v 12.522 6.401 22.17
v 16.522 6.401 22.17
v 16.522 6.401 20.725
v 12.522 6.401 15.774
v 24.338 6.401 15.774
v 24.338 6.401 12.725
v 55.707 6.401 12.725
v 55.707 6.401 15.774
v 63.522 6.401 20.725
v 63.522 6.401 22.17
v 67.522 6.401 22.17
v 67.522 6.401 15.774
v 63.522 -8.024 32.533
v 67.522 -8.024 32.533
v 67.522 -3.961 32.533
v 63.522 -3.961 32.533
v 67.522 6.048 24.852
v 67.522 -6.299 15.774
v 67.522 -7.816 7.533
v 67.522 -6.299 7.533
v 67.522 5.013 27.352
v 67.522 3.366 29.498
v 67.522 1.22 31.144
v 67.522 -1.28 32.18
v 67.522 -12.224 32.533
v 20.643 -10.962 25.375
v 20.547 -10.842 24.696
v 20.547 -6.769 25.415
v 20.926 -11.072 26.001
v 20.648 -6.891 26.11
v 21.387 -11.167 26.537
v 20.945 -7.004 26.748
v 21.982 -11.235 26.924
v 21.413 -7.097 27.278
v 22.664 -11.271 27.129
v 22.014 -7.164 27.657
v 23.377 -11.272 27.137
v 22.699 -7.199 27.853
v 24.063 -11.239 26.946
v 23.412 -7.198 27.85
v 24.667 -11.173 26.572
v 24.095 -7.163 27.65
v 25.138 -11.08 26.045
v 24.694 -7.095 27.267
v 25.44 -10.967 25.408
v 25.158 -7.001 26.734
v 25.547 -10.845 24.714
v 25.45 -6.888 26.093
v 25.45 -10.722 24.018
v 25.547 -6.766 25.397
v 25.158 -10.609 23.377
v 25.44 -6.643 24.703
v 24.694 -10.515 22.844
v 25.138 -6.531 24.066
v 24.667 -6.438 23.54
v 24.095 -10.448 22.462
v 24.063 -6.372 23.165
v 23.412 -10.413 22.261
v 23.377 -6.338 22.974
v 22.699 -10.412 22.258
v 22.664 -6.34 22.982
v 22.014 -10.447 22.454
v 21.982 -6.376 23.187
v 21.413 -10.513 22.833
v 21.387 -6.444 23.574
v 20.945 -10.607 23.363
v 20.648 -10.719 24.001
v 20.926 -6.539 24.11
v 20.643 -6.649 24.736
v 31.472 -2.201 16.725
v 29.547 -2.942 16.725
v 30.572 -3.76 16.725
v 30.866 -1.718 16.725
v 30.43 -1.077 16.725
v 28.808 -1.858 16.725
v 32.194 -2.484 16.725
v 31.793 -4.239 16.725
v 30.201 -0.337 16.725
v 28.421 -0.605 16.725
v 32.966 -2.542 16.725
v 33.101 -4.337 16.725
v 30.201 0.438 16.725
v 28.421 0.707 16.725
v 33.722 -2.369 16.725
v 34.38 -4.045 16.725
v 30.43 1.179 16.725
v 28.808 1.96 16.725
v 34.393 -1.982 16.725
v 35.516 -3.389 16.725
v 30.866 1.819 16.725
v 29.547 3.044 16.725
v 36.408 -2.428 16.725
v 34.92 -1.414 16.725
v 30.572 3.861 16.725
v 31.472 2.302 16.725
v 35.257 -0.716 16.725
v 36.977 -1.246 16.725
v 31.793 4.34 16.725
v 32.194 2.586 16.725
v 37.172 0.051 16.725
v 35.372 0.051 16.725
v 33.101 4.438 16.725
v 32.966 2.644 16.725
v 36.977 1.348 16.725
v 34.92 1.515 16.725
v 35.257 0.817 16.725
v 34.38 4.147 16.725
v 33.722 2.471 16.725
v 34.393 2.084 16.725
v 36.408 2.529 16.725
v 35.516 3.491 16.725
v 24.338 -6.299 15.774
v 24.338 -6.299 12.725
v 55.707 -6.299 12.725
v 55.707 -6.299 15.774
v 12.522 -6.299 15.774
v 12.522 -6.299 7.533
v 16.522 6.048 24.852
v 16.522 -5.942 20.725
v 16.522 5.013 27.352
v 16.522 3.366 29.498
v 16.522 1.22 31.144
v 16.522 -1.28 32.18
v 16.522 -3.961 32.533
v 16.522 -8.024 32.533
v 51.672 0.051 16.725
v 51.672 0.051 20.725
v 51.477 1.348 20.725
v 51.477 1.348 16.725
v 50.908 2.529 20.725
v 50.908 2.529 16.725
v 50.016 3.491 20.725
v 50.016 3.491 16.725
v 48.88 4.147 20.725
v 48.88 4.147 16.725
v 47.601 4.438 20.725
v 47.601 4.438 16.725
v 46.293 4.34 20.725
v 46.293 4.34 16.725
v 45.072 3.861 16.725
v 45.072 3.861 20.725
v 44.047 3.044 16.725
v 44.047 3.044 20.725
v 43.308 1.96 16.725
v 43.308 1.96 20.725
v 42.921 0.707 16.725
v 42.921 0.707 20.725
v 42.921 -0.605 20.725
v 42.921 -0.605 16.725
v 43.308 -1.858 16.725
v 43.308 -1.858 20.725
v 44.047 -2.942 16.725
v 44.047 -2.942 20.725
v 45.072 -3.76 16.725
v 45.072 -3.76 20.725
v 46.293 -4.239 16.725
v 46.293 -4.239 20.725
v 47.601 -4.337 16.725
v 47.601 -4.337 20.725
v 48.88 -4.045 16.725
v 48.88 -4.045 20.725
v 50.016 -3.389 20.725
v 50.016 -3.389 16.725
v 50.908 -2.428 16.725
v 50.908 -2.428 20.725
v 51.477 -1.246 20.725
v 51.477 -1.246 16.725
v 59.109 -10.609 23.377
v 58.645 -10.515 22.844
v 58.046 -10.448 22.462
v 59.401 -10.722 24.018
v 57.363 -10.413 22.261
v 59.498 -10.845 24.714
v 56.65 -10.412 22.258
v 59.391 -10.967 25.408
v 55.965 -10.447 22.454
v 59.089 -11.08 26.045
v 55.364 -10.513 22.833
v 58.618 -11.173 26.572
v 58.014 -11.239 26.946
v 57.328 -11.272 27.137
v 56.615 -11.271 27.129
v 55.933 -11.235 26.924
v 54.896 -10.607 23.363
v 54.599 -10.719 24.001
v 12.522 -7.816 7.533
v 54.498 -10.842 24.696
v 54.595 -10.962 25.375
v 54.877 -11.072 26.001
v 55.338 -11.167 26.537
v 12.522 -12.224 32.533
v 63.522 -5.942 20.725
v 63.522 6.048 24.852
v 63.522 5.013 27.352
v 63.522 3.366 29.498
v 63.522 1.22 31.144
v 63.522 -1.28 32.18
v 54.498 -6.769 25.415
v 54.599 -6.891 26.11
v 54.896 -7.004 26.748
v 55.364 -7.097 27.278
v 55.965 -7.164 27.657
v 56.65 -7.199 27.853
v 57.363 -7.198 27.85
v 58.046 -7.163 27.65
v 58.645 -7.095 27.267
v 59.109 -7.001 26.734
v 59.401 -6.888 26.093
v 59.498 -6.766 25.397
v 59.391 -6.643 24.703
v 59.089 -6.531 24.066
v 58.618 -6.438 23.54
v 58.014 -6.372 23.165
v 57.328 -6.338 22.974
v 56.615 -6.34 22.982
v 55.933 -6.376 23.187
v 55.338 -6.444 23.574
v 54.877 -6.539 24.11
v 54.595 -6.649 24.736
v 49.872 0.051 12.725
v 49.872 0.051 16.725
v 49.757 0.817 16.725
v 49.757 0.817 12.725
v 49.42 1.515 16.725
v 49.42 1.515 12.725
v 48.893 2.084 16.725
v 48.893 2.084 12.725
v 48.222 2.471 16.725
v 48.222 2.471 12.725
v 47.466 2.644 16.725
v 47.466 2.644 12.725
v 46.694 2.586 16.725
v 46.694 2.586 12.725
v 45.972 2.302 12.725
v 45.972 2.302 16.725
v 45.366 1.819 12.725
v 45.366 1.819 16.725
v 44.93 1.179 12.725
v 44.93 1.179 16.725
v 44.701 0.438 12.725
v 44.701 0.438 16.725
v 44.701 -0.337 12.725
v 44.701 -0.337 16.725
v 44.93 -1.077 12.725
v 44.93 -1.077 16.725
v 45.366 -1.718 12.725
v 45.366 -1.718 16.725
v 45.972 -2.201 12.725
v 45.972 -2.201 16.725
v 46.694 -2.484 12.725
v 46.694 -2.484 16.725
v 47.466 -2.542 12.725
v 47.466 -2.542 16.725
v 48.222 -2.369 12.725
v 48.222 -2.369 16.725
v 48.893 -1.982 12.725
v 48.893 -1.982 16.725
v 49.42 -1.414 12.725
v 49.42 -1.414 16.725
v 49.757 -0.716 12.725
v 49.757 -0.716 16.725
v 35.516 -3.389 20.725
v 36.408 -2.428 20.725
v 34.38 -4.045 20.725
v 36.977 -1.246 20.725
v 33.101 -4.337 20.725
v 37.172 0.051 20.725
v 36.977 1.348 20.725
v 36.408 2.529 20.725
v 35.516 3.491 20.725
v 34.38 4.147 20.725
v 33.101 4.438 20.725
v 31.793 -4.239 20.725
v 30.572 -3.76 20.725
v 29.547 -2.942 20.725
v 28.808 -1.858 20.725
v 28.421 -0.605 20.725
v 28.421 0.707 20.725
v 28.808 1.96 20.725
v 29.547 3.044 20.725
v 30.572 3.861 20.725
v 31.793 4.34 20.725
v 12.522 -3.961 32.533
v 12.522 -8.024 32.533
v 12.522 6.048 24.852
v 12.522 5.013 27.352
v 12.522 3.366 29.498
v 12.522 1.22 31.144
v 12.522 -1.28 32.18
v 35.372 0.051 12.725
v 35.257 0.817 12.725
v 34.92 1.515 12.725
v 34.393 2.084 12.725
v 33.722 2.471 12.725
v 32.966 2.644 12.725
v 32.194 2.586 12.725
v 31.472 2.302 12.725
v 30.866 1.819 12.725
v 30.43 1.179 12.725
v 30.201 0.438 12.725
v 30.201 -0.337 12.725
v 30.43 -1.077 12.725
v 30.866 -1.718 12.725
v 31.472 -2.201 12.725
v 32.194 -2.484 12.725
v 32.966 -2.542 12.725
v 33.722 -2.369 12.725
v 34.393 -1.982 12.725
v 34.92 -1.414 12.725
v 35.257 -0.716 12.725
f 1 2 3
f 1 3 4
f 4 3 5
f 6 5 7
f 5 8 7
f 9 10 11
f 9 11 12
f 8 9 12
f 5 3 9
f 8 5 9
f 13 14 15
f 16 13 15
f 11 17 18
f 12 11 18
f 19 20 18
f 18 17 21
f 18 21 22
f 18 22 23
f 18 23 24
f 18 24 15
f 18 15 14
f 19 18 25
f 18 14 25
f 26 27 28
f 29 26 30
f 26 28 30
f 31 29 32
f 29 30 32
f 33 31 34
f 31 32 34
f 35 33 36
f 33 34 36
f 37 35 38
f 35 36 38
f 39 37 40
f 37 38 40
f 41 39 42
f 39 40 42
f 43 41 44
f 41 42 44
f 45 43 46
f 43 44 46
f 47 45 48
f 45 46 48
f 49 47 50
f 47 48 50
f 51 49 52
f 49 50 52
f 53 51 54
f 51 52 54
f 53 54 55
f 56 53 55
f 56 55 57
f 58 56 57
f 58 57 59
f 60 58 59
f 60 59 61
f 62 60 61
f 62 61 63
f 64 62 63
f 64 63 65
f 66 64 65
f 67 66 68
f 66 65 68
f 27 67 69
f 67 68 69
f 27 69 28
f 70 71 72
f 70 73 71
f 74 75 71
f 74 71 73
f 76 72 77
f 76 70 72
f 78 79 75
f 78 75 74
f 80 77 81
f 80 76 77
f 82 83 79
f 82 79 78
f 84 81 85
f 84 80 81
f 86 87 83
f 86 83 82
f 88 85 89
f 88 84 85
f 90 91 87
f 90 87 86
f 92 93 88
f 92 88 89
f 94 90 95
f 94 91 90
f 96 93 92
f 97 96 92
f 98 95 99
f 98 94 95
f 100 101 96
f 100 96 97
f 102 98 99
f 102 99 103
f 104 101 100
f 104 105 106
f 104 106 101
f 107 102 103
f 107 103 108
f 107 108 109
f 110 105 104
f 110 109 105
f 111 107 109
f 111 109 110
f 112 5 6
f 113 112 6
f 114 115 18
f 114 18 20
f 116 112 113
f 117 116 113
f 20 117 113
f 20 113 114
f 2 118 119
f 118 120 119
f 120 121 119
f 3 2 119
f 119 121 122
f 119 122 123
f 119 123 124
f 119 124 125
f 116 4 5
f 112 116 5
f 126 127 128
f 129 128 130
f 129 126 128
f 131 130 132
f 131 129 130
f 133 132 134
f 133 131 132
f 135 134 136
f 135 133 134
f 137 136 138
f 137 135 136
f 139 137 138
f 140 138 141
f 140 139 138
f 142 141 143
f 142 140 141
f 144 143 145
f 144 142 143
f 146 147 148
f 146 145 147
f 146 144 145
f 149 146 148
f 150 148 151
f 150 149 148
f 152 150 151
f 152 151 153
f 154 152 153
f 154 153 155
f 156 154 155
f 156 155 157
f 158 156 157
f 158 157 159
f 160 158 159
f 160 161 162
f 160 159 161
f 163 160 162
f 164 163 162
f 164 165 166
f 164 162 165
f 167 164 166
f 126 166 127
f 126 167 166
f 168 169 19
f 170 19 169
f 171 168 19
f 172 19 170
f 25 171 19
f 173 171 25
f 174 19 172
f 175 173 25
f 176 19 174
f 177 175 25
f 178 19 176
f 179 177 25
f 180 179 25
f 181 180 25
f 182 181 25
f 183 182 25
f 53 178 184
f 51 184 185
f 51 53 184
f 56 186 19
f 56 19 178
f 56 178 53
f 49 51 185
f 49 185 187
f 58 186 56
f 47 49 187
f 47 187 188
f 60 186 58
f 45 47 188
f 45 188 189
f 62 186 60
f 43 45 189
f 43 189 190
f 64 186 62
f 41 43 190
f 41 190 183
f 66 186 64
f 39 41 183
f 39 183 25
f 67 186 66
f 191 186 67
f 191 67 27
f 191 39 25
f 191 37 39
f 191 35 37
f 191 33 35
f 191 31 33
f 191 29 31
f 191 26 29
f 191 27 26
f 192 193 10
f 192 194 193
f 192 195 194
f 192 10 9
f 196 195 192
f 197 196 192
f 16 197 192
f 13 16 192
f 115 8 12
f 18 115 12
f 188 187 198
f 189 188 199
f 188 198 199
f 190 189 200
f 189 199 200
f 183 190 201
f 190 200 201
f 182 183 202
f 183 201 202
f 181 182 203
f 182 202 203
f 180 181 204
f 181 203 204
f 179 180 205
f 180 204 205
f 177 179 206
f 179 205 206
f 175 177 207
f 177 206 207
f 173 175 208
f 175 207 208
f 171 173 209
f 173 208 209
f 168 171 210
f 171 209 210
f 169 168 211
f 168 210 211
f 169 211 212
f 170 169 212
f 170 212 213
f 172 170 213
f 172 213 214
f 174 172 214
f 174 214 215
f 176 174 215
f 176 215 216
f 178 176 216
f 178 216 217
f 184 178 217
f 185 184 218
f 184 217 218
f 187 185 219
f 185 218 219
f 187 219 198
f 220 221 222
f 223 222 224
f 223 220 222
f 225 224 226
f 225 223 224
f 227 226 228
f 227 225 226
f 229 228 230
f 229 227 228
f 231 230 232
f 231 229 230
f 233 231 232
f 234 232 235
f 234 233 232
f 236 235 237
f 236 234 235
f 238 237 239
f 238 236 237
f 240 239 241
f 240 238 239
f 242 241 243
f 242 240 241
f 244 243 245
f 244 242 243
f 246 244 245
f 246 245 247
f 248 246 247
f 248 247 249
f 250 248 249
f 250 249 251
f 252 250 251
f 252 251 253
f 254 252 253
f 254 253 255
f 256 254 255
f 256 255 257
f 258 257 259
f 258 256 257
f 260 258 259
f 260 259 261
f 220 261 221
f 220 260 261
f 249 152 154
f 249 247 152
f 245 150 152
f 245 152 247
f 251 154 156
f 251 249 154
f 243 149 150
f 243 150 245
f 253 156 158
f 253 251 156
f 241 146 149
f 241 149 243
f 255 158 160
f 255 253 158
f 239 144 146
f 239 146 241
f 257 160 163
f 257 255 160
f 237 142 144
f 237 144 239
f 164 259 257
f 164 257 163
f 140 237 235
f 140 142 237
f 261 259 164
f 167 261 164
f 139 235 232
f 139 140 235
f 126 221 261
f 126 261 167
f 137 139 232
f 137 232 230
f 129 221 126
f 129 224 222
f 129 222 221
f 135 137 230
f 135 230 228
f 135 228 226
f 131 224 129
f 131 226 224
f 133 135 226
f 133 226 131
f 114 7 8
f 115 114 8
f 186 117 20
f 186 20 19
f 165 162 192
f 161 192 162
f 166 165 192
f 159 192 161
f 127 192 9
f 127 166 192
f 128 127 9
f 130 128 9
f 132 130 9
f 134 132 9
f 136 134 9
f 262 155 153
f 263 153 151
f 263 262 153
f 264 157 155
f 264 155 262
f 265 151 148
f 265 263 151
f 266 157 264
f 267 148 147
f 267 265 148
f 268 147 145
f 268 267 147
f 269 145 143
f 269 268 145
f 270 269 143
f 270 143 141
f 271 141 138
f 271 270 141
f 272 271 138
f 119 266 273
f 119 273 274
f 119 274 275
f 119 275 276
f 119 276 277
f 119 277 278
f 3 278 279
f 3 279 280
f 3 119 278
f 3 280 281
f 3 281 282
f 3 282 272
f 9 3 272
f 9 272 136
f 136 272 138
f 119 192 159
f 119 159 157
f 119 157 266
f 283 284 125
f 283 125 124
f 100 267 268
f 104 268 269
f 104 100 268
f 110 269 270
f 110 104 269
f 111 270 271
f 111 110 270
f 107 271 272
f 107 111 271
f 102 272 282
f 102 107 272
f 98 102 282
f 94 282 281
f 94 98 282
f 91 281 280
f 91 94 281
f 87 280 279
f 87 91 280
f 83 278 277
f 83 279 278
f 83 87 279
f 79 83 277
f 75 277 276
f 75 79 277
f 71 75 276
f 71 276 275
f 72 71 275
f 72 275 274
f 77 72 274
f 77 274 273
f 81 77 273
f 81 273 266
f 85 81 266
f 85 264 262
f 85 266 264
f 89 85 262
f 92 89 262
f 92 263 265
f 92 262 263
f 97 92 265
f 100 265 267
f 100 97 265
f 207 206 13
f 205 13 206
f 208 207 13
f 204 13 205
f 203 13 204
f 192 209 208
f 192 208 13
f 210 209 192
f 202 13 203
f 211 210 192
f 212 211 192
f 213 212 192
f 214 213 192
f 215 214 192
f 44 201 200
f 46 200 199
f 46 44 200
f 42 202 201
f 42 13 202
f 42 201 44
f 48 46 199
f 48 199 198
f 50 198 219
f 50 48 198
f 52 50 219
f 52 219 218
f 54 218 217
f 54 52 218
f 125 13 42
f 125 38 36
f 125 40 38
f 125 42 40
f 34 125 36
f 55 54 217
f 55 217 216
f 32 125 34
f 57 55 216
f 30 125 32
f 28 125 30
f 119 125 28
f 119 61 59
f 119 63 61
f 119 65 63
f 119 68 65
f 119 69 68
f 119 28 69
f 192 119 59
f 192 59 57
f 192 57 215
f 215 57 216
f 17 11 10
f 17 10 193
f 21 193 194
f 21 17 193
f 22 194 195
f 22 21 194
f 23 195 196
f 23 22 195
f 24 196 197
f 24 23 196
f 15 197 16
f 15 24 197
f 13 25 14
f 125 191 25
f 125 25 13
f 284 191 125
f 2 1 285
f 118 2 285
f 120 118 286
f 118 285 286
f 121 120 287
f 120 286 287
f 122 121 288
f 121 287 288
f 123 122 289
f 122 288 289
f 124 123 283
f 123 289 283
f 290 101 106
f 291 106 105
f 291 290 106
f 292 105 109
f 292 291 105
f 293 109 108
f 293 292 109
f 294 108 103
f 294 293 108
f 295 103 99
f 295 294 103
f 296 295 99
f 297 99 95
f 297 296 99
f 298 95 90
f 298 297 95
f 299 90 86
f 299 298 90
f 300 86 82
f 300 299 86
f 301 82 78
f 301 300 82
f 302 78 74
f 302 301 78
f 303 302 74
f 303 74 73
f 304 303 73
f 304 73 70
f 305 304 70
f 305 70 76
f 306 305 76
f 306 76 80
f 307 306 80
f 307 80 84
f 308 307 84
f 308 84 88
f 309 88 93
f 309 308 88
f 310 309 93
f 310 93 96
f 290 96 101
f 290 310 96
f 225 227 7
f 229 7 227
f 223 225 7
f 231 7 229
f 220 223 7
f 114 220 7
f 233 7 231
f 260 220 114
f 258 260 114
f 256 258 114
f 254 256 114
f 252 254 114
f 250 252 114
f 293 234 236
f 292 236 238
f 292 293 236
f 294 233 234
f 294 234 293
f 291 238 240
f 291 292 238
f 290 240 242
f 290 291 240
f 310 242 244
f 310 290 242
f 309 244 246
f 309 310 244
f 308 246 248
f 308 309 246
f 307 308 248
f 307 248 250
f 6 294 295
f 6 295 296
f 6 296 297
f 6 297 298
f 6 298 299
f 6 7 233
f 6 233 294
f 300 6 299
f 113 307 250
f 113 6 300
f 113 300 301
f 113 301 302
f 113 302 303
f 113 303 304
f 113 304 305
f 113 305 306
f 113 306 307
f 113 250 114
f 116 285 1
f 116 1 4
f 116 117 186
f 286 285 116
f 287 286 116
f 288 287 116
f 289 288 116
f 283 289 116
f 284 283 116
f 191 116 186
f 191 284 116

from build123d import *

# Parameters (mm, degrees)
PAD004_DEPTH    = 55
SKETCH007_R     = 2.6
POCKET_DEPTH    = 10
SKETCH005_R     = 2.5
POCKET002_DEPTH = 5
SKETCH008_R     = 4.4
POCKET003_DEPTH = 5
PAD005_DEPTH    = 4
PAD006_DEPTH    = 4
POCKET005_DEPTH = 12.7


with BuildPart() as part:
    # Sketch004 → Pad004 (new body)
    with BuildSketch(Plane.YZ):
        Polygon((-1.516354, -5.192676), (-5.924528, 19.807324), (-1.724528, 19.807324), (0.357421, 8), (12.7, 8), (12.7, 0), (0, 0), (0, -5.192676), align=None)
    extrude(amount=PAD004_DEPTH)

    # Sketch007 → Pocket (cut)
    with BuildSketch(Plane.XY):
        with Locations((20.25, 6.35)):
            Circle(SKETCH007_R)
        with Locations((34.75, 6.35)):
            Circle(SKETCH007_R)
    extrude(amount=POCKET_DEPTH, mode=Mode.SUBTRACT)

    # Sketch005 → Pocket002 (cut)
    with BuildSketch(Plane(origin=(0, 2, 0), x_dir=(-1, 0, 0), z_dir=(0, 0.984808, 0.173648))):
        with Locations((-44.475514, 12.925289)):
            Circle(SKETCH005_R)
        with Locations((-10.524486, 12.925289)):
            Circle(SKETCH005_R)
    extrude(amount=-POCKET002_DEPTH, mode=Mode.SUBTRACT)

    # Sketch008 → Pocket003 (cut)
    with BuildSketch(Plane.XY.offset(4)):
        with Locations((20.25, 6.35)):
            Circle(SKETCH008_R)
        with Locations((34.75, 6.35)):
            Circle(SKETCH008_R)
    extrude(amount=POCKET003_DEPTH, mode=Mode.SUBTRACT)

    # Sketch009 → Pad005 (join)
    with BuildSketch(Plane.YZ):
        with BuildLine():
            Line((12.7, 8), (0.357421, 8))
            Line((0.357421, 8), (-1.724529, 19.807325))
            Line((-1.724529, 19.807325), (2.337742, 19.807325))
            ThreePointArc((12.7, 9.445067), (9.664965, 16.77229), (2.337742, 19.807325))
            Line((12.7, 9.445067), (12.7, 8))
        make_face()
    extrude(amount=PAD005_DEPTH)

    # Sketch010 → Pad006 (join)
    with BuildSketch(Plane.YZ.offset(55)):
        with BuildLine():
            Line((12.7, 8), (0.357421, 8))
            Line((0.357421, 8), (-1.724529, 19.807325))
            Line((-1.724529, 19.807325), (2.337742, 19.807325))
            ThreePointArc((12.7, 9.445067), (9.664965, 16.77229), (2.337742, 19.807325))
            Line((12.7, 9.445067), (12.7, 8))
        make_face()
    extrude(amount=-PAD006_DEPTH)

    # Sketch012 (on Face10 of Pad006) → Pocket005 (cut)
    with BuildSketch(Plane.ZX.offset(12.7)):
        Polygon((0, 43.184493), (3.048737, 43.184493), (3.048737, 55), (-3.047035, 55), (-3.047035, 0), (0, 0), (3.048737, 0), (3.048737, 11.815507), (0, 11.815507), align=None)
    extrude(amount=-POCKET005_DEPTH, mode=Mode.SUBTRACT)


with BuildPart() as part_1:
    # Body004 placement: moved
    add(part.part.moved(Location((12.5222, -6.2992, 12.7254))))


solid = part_1.part
